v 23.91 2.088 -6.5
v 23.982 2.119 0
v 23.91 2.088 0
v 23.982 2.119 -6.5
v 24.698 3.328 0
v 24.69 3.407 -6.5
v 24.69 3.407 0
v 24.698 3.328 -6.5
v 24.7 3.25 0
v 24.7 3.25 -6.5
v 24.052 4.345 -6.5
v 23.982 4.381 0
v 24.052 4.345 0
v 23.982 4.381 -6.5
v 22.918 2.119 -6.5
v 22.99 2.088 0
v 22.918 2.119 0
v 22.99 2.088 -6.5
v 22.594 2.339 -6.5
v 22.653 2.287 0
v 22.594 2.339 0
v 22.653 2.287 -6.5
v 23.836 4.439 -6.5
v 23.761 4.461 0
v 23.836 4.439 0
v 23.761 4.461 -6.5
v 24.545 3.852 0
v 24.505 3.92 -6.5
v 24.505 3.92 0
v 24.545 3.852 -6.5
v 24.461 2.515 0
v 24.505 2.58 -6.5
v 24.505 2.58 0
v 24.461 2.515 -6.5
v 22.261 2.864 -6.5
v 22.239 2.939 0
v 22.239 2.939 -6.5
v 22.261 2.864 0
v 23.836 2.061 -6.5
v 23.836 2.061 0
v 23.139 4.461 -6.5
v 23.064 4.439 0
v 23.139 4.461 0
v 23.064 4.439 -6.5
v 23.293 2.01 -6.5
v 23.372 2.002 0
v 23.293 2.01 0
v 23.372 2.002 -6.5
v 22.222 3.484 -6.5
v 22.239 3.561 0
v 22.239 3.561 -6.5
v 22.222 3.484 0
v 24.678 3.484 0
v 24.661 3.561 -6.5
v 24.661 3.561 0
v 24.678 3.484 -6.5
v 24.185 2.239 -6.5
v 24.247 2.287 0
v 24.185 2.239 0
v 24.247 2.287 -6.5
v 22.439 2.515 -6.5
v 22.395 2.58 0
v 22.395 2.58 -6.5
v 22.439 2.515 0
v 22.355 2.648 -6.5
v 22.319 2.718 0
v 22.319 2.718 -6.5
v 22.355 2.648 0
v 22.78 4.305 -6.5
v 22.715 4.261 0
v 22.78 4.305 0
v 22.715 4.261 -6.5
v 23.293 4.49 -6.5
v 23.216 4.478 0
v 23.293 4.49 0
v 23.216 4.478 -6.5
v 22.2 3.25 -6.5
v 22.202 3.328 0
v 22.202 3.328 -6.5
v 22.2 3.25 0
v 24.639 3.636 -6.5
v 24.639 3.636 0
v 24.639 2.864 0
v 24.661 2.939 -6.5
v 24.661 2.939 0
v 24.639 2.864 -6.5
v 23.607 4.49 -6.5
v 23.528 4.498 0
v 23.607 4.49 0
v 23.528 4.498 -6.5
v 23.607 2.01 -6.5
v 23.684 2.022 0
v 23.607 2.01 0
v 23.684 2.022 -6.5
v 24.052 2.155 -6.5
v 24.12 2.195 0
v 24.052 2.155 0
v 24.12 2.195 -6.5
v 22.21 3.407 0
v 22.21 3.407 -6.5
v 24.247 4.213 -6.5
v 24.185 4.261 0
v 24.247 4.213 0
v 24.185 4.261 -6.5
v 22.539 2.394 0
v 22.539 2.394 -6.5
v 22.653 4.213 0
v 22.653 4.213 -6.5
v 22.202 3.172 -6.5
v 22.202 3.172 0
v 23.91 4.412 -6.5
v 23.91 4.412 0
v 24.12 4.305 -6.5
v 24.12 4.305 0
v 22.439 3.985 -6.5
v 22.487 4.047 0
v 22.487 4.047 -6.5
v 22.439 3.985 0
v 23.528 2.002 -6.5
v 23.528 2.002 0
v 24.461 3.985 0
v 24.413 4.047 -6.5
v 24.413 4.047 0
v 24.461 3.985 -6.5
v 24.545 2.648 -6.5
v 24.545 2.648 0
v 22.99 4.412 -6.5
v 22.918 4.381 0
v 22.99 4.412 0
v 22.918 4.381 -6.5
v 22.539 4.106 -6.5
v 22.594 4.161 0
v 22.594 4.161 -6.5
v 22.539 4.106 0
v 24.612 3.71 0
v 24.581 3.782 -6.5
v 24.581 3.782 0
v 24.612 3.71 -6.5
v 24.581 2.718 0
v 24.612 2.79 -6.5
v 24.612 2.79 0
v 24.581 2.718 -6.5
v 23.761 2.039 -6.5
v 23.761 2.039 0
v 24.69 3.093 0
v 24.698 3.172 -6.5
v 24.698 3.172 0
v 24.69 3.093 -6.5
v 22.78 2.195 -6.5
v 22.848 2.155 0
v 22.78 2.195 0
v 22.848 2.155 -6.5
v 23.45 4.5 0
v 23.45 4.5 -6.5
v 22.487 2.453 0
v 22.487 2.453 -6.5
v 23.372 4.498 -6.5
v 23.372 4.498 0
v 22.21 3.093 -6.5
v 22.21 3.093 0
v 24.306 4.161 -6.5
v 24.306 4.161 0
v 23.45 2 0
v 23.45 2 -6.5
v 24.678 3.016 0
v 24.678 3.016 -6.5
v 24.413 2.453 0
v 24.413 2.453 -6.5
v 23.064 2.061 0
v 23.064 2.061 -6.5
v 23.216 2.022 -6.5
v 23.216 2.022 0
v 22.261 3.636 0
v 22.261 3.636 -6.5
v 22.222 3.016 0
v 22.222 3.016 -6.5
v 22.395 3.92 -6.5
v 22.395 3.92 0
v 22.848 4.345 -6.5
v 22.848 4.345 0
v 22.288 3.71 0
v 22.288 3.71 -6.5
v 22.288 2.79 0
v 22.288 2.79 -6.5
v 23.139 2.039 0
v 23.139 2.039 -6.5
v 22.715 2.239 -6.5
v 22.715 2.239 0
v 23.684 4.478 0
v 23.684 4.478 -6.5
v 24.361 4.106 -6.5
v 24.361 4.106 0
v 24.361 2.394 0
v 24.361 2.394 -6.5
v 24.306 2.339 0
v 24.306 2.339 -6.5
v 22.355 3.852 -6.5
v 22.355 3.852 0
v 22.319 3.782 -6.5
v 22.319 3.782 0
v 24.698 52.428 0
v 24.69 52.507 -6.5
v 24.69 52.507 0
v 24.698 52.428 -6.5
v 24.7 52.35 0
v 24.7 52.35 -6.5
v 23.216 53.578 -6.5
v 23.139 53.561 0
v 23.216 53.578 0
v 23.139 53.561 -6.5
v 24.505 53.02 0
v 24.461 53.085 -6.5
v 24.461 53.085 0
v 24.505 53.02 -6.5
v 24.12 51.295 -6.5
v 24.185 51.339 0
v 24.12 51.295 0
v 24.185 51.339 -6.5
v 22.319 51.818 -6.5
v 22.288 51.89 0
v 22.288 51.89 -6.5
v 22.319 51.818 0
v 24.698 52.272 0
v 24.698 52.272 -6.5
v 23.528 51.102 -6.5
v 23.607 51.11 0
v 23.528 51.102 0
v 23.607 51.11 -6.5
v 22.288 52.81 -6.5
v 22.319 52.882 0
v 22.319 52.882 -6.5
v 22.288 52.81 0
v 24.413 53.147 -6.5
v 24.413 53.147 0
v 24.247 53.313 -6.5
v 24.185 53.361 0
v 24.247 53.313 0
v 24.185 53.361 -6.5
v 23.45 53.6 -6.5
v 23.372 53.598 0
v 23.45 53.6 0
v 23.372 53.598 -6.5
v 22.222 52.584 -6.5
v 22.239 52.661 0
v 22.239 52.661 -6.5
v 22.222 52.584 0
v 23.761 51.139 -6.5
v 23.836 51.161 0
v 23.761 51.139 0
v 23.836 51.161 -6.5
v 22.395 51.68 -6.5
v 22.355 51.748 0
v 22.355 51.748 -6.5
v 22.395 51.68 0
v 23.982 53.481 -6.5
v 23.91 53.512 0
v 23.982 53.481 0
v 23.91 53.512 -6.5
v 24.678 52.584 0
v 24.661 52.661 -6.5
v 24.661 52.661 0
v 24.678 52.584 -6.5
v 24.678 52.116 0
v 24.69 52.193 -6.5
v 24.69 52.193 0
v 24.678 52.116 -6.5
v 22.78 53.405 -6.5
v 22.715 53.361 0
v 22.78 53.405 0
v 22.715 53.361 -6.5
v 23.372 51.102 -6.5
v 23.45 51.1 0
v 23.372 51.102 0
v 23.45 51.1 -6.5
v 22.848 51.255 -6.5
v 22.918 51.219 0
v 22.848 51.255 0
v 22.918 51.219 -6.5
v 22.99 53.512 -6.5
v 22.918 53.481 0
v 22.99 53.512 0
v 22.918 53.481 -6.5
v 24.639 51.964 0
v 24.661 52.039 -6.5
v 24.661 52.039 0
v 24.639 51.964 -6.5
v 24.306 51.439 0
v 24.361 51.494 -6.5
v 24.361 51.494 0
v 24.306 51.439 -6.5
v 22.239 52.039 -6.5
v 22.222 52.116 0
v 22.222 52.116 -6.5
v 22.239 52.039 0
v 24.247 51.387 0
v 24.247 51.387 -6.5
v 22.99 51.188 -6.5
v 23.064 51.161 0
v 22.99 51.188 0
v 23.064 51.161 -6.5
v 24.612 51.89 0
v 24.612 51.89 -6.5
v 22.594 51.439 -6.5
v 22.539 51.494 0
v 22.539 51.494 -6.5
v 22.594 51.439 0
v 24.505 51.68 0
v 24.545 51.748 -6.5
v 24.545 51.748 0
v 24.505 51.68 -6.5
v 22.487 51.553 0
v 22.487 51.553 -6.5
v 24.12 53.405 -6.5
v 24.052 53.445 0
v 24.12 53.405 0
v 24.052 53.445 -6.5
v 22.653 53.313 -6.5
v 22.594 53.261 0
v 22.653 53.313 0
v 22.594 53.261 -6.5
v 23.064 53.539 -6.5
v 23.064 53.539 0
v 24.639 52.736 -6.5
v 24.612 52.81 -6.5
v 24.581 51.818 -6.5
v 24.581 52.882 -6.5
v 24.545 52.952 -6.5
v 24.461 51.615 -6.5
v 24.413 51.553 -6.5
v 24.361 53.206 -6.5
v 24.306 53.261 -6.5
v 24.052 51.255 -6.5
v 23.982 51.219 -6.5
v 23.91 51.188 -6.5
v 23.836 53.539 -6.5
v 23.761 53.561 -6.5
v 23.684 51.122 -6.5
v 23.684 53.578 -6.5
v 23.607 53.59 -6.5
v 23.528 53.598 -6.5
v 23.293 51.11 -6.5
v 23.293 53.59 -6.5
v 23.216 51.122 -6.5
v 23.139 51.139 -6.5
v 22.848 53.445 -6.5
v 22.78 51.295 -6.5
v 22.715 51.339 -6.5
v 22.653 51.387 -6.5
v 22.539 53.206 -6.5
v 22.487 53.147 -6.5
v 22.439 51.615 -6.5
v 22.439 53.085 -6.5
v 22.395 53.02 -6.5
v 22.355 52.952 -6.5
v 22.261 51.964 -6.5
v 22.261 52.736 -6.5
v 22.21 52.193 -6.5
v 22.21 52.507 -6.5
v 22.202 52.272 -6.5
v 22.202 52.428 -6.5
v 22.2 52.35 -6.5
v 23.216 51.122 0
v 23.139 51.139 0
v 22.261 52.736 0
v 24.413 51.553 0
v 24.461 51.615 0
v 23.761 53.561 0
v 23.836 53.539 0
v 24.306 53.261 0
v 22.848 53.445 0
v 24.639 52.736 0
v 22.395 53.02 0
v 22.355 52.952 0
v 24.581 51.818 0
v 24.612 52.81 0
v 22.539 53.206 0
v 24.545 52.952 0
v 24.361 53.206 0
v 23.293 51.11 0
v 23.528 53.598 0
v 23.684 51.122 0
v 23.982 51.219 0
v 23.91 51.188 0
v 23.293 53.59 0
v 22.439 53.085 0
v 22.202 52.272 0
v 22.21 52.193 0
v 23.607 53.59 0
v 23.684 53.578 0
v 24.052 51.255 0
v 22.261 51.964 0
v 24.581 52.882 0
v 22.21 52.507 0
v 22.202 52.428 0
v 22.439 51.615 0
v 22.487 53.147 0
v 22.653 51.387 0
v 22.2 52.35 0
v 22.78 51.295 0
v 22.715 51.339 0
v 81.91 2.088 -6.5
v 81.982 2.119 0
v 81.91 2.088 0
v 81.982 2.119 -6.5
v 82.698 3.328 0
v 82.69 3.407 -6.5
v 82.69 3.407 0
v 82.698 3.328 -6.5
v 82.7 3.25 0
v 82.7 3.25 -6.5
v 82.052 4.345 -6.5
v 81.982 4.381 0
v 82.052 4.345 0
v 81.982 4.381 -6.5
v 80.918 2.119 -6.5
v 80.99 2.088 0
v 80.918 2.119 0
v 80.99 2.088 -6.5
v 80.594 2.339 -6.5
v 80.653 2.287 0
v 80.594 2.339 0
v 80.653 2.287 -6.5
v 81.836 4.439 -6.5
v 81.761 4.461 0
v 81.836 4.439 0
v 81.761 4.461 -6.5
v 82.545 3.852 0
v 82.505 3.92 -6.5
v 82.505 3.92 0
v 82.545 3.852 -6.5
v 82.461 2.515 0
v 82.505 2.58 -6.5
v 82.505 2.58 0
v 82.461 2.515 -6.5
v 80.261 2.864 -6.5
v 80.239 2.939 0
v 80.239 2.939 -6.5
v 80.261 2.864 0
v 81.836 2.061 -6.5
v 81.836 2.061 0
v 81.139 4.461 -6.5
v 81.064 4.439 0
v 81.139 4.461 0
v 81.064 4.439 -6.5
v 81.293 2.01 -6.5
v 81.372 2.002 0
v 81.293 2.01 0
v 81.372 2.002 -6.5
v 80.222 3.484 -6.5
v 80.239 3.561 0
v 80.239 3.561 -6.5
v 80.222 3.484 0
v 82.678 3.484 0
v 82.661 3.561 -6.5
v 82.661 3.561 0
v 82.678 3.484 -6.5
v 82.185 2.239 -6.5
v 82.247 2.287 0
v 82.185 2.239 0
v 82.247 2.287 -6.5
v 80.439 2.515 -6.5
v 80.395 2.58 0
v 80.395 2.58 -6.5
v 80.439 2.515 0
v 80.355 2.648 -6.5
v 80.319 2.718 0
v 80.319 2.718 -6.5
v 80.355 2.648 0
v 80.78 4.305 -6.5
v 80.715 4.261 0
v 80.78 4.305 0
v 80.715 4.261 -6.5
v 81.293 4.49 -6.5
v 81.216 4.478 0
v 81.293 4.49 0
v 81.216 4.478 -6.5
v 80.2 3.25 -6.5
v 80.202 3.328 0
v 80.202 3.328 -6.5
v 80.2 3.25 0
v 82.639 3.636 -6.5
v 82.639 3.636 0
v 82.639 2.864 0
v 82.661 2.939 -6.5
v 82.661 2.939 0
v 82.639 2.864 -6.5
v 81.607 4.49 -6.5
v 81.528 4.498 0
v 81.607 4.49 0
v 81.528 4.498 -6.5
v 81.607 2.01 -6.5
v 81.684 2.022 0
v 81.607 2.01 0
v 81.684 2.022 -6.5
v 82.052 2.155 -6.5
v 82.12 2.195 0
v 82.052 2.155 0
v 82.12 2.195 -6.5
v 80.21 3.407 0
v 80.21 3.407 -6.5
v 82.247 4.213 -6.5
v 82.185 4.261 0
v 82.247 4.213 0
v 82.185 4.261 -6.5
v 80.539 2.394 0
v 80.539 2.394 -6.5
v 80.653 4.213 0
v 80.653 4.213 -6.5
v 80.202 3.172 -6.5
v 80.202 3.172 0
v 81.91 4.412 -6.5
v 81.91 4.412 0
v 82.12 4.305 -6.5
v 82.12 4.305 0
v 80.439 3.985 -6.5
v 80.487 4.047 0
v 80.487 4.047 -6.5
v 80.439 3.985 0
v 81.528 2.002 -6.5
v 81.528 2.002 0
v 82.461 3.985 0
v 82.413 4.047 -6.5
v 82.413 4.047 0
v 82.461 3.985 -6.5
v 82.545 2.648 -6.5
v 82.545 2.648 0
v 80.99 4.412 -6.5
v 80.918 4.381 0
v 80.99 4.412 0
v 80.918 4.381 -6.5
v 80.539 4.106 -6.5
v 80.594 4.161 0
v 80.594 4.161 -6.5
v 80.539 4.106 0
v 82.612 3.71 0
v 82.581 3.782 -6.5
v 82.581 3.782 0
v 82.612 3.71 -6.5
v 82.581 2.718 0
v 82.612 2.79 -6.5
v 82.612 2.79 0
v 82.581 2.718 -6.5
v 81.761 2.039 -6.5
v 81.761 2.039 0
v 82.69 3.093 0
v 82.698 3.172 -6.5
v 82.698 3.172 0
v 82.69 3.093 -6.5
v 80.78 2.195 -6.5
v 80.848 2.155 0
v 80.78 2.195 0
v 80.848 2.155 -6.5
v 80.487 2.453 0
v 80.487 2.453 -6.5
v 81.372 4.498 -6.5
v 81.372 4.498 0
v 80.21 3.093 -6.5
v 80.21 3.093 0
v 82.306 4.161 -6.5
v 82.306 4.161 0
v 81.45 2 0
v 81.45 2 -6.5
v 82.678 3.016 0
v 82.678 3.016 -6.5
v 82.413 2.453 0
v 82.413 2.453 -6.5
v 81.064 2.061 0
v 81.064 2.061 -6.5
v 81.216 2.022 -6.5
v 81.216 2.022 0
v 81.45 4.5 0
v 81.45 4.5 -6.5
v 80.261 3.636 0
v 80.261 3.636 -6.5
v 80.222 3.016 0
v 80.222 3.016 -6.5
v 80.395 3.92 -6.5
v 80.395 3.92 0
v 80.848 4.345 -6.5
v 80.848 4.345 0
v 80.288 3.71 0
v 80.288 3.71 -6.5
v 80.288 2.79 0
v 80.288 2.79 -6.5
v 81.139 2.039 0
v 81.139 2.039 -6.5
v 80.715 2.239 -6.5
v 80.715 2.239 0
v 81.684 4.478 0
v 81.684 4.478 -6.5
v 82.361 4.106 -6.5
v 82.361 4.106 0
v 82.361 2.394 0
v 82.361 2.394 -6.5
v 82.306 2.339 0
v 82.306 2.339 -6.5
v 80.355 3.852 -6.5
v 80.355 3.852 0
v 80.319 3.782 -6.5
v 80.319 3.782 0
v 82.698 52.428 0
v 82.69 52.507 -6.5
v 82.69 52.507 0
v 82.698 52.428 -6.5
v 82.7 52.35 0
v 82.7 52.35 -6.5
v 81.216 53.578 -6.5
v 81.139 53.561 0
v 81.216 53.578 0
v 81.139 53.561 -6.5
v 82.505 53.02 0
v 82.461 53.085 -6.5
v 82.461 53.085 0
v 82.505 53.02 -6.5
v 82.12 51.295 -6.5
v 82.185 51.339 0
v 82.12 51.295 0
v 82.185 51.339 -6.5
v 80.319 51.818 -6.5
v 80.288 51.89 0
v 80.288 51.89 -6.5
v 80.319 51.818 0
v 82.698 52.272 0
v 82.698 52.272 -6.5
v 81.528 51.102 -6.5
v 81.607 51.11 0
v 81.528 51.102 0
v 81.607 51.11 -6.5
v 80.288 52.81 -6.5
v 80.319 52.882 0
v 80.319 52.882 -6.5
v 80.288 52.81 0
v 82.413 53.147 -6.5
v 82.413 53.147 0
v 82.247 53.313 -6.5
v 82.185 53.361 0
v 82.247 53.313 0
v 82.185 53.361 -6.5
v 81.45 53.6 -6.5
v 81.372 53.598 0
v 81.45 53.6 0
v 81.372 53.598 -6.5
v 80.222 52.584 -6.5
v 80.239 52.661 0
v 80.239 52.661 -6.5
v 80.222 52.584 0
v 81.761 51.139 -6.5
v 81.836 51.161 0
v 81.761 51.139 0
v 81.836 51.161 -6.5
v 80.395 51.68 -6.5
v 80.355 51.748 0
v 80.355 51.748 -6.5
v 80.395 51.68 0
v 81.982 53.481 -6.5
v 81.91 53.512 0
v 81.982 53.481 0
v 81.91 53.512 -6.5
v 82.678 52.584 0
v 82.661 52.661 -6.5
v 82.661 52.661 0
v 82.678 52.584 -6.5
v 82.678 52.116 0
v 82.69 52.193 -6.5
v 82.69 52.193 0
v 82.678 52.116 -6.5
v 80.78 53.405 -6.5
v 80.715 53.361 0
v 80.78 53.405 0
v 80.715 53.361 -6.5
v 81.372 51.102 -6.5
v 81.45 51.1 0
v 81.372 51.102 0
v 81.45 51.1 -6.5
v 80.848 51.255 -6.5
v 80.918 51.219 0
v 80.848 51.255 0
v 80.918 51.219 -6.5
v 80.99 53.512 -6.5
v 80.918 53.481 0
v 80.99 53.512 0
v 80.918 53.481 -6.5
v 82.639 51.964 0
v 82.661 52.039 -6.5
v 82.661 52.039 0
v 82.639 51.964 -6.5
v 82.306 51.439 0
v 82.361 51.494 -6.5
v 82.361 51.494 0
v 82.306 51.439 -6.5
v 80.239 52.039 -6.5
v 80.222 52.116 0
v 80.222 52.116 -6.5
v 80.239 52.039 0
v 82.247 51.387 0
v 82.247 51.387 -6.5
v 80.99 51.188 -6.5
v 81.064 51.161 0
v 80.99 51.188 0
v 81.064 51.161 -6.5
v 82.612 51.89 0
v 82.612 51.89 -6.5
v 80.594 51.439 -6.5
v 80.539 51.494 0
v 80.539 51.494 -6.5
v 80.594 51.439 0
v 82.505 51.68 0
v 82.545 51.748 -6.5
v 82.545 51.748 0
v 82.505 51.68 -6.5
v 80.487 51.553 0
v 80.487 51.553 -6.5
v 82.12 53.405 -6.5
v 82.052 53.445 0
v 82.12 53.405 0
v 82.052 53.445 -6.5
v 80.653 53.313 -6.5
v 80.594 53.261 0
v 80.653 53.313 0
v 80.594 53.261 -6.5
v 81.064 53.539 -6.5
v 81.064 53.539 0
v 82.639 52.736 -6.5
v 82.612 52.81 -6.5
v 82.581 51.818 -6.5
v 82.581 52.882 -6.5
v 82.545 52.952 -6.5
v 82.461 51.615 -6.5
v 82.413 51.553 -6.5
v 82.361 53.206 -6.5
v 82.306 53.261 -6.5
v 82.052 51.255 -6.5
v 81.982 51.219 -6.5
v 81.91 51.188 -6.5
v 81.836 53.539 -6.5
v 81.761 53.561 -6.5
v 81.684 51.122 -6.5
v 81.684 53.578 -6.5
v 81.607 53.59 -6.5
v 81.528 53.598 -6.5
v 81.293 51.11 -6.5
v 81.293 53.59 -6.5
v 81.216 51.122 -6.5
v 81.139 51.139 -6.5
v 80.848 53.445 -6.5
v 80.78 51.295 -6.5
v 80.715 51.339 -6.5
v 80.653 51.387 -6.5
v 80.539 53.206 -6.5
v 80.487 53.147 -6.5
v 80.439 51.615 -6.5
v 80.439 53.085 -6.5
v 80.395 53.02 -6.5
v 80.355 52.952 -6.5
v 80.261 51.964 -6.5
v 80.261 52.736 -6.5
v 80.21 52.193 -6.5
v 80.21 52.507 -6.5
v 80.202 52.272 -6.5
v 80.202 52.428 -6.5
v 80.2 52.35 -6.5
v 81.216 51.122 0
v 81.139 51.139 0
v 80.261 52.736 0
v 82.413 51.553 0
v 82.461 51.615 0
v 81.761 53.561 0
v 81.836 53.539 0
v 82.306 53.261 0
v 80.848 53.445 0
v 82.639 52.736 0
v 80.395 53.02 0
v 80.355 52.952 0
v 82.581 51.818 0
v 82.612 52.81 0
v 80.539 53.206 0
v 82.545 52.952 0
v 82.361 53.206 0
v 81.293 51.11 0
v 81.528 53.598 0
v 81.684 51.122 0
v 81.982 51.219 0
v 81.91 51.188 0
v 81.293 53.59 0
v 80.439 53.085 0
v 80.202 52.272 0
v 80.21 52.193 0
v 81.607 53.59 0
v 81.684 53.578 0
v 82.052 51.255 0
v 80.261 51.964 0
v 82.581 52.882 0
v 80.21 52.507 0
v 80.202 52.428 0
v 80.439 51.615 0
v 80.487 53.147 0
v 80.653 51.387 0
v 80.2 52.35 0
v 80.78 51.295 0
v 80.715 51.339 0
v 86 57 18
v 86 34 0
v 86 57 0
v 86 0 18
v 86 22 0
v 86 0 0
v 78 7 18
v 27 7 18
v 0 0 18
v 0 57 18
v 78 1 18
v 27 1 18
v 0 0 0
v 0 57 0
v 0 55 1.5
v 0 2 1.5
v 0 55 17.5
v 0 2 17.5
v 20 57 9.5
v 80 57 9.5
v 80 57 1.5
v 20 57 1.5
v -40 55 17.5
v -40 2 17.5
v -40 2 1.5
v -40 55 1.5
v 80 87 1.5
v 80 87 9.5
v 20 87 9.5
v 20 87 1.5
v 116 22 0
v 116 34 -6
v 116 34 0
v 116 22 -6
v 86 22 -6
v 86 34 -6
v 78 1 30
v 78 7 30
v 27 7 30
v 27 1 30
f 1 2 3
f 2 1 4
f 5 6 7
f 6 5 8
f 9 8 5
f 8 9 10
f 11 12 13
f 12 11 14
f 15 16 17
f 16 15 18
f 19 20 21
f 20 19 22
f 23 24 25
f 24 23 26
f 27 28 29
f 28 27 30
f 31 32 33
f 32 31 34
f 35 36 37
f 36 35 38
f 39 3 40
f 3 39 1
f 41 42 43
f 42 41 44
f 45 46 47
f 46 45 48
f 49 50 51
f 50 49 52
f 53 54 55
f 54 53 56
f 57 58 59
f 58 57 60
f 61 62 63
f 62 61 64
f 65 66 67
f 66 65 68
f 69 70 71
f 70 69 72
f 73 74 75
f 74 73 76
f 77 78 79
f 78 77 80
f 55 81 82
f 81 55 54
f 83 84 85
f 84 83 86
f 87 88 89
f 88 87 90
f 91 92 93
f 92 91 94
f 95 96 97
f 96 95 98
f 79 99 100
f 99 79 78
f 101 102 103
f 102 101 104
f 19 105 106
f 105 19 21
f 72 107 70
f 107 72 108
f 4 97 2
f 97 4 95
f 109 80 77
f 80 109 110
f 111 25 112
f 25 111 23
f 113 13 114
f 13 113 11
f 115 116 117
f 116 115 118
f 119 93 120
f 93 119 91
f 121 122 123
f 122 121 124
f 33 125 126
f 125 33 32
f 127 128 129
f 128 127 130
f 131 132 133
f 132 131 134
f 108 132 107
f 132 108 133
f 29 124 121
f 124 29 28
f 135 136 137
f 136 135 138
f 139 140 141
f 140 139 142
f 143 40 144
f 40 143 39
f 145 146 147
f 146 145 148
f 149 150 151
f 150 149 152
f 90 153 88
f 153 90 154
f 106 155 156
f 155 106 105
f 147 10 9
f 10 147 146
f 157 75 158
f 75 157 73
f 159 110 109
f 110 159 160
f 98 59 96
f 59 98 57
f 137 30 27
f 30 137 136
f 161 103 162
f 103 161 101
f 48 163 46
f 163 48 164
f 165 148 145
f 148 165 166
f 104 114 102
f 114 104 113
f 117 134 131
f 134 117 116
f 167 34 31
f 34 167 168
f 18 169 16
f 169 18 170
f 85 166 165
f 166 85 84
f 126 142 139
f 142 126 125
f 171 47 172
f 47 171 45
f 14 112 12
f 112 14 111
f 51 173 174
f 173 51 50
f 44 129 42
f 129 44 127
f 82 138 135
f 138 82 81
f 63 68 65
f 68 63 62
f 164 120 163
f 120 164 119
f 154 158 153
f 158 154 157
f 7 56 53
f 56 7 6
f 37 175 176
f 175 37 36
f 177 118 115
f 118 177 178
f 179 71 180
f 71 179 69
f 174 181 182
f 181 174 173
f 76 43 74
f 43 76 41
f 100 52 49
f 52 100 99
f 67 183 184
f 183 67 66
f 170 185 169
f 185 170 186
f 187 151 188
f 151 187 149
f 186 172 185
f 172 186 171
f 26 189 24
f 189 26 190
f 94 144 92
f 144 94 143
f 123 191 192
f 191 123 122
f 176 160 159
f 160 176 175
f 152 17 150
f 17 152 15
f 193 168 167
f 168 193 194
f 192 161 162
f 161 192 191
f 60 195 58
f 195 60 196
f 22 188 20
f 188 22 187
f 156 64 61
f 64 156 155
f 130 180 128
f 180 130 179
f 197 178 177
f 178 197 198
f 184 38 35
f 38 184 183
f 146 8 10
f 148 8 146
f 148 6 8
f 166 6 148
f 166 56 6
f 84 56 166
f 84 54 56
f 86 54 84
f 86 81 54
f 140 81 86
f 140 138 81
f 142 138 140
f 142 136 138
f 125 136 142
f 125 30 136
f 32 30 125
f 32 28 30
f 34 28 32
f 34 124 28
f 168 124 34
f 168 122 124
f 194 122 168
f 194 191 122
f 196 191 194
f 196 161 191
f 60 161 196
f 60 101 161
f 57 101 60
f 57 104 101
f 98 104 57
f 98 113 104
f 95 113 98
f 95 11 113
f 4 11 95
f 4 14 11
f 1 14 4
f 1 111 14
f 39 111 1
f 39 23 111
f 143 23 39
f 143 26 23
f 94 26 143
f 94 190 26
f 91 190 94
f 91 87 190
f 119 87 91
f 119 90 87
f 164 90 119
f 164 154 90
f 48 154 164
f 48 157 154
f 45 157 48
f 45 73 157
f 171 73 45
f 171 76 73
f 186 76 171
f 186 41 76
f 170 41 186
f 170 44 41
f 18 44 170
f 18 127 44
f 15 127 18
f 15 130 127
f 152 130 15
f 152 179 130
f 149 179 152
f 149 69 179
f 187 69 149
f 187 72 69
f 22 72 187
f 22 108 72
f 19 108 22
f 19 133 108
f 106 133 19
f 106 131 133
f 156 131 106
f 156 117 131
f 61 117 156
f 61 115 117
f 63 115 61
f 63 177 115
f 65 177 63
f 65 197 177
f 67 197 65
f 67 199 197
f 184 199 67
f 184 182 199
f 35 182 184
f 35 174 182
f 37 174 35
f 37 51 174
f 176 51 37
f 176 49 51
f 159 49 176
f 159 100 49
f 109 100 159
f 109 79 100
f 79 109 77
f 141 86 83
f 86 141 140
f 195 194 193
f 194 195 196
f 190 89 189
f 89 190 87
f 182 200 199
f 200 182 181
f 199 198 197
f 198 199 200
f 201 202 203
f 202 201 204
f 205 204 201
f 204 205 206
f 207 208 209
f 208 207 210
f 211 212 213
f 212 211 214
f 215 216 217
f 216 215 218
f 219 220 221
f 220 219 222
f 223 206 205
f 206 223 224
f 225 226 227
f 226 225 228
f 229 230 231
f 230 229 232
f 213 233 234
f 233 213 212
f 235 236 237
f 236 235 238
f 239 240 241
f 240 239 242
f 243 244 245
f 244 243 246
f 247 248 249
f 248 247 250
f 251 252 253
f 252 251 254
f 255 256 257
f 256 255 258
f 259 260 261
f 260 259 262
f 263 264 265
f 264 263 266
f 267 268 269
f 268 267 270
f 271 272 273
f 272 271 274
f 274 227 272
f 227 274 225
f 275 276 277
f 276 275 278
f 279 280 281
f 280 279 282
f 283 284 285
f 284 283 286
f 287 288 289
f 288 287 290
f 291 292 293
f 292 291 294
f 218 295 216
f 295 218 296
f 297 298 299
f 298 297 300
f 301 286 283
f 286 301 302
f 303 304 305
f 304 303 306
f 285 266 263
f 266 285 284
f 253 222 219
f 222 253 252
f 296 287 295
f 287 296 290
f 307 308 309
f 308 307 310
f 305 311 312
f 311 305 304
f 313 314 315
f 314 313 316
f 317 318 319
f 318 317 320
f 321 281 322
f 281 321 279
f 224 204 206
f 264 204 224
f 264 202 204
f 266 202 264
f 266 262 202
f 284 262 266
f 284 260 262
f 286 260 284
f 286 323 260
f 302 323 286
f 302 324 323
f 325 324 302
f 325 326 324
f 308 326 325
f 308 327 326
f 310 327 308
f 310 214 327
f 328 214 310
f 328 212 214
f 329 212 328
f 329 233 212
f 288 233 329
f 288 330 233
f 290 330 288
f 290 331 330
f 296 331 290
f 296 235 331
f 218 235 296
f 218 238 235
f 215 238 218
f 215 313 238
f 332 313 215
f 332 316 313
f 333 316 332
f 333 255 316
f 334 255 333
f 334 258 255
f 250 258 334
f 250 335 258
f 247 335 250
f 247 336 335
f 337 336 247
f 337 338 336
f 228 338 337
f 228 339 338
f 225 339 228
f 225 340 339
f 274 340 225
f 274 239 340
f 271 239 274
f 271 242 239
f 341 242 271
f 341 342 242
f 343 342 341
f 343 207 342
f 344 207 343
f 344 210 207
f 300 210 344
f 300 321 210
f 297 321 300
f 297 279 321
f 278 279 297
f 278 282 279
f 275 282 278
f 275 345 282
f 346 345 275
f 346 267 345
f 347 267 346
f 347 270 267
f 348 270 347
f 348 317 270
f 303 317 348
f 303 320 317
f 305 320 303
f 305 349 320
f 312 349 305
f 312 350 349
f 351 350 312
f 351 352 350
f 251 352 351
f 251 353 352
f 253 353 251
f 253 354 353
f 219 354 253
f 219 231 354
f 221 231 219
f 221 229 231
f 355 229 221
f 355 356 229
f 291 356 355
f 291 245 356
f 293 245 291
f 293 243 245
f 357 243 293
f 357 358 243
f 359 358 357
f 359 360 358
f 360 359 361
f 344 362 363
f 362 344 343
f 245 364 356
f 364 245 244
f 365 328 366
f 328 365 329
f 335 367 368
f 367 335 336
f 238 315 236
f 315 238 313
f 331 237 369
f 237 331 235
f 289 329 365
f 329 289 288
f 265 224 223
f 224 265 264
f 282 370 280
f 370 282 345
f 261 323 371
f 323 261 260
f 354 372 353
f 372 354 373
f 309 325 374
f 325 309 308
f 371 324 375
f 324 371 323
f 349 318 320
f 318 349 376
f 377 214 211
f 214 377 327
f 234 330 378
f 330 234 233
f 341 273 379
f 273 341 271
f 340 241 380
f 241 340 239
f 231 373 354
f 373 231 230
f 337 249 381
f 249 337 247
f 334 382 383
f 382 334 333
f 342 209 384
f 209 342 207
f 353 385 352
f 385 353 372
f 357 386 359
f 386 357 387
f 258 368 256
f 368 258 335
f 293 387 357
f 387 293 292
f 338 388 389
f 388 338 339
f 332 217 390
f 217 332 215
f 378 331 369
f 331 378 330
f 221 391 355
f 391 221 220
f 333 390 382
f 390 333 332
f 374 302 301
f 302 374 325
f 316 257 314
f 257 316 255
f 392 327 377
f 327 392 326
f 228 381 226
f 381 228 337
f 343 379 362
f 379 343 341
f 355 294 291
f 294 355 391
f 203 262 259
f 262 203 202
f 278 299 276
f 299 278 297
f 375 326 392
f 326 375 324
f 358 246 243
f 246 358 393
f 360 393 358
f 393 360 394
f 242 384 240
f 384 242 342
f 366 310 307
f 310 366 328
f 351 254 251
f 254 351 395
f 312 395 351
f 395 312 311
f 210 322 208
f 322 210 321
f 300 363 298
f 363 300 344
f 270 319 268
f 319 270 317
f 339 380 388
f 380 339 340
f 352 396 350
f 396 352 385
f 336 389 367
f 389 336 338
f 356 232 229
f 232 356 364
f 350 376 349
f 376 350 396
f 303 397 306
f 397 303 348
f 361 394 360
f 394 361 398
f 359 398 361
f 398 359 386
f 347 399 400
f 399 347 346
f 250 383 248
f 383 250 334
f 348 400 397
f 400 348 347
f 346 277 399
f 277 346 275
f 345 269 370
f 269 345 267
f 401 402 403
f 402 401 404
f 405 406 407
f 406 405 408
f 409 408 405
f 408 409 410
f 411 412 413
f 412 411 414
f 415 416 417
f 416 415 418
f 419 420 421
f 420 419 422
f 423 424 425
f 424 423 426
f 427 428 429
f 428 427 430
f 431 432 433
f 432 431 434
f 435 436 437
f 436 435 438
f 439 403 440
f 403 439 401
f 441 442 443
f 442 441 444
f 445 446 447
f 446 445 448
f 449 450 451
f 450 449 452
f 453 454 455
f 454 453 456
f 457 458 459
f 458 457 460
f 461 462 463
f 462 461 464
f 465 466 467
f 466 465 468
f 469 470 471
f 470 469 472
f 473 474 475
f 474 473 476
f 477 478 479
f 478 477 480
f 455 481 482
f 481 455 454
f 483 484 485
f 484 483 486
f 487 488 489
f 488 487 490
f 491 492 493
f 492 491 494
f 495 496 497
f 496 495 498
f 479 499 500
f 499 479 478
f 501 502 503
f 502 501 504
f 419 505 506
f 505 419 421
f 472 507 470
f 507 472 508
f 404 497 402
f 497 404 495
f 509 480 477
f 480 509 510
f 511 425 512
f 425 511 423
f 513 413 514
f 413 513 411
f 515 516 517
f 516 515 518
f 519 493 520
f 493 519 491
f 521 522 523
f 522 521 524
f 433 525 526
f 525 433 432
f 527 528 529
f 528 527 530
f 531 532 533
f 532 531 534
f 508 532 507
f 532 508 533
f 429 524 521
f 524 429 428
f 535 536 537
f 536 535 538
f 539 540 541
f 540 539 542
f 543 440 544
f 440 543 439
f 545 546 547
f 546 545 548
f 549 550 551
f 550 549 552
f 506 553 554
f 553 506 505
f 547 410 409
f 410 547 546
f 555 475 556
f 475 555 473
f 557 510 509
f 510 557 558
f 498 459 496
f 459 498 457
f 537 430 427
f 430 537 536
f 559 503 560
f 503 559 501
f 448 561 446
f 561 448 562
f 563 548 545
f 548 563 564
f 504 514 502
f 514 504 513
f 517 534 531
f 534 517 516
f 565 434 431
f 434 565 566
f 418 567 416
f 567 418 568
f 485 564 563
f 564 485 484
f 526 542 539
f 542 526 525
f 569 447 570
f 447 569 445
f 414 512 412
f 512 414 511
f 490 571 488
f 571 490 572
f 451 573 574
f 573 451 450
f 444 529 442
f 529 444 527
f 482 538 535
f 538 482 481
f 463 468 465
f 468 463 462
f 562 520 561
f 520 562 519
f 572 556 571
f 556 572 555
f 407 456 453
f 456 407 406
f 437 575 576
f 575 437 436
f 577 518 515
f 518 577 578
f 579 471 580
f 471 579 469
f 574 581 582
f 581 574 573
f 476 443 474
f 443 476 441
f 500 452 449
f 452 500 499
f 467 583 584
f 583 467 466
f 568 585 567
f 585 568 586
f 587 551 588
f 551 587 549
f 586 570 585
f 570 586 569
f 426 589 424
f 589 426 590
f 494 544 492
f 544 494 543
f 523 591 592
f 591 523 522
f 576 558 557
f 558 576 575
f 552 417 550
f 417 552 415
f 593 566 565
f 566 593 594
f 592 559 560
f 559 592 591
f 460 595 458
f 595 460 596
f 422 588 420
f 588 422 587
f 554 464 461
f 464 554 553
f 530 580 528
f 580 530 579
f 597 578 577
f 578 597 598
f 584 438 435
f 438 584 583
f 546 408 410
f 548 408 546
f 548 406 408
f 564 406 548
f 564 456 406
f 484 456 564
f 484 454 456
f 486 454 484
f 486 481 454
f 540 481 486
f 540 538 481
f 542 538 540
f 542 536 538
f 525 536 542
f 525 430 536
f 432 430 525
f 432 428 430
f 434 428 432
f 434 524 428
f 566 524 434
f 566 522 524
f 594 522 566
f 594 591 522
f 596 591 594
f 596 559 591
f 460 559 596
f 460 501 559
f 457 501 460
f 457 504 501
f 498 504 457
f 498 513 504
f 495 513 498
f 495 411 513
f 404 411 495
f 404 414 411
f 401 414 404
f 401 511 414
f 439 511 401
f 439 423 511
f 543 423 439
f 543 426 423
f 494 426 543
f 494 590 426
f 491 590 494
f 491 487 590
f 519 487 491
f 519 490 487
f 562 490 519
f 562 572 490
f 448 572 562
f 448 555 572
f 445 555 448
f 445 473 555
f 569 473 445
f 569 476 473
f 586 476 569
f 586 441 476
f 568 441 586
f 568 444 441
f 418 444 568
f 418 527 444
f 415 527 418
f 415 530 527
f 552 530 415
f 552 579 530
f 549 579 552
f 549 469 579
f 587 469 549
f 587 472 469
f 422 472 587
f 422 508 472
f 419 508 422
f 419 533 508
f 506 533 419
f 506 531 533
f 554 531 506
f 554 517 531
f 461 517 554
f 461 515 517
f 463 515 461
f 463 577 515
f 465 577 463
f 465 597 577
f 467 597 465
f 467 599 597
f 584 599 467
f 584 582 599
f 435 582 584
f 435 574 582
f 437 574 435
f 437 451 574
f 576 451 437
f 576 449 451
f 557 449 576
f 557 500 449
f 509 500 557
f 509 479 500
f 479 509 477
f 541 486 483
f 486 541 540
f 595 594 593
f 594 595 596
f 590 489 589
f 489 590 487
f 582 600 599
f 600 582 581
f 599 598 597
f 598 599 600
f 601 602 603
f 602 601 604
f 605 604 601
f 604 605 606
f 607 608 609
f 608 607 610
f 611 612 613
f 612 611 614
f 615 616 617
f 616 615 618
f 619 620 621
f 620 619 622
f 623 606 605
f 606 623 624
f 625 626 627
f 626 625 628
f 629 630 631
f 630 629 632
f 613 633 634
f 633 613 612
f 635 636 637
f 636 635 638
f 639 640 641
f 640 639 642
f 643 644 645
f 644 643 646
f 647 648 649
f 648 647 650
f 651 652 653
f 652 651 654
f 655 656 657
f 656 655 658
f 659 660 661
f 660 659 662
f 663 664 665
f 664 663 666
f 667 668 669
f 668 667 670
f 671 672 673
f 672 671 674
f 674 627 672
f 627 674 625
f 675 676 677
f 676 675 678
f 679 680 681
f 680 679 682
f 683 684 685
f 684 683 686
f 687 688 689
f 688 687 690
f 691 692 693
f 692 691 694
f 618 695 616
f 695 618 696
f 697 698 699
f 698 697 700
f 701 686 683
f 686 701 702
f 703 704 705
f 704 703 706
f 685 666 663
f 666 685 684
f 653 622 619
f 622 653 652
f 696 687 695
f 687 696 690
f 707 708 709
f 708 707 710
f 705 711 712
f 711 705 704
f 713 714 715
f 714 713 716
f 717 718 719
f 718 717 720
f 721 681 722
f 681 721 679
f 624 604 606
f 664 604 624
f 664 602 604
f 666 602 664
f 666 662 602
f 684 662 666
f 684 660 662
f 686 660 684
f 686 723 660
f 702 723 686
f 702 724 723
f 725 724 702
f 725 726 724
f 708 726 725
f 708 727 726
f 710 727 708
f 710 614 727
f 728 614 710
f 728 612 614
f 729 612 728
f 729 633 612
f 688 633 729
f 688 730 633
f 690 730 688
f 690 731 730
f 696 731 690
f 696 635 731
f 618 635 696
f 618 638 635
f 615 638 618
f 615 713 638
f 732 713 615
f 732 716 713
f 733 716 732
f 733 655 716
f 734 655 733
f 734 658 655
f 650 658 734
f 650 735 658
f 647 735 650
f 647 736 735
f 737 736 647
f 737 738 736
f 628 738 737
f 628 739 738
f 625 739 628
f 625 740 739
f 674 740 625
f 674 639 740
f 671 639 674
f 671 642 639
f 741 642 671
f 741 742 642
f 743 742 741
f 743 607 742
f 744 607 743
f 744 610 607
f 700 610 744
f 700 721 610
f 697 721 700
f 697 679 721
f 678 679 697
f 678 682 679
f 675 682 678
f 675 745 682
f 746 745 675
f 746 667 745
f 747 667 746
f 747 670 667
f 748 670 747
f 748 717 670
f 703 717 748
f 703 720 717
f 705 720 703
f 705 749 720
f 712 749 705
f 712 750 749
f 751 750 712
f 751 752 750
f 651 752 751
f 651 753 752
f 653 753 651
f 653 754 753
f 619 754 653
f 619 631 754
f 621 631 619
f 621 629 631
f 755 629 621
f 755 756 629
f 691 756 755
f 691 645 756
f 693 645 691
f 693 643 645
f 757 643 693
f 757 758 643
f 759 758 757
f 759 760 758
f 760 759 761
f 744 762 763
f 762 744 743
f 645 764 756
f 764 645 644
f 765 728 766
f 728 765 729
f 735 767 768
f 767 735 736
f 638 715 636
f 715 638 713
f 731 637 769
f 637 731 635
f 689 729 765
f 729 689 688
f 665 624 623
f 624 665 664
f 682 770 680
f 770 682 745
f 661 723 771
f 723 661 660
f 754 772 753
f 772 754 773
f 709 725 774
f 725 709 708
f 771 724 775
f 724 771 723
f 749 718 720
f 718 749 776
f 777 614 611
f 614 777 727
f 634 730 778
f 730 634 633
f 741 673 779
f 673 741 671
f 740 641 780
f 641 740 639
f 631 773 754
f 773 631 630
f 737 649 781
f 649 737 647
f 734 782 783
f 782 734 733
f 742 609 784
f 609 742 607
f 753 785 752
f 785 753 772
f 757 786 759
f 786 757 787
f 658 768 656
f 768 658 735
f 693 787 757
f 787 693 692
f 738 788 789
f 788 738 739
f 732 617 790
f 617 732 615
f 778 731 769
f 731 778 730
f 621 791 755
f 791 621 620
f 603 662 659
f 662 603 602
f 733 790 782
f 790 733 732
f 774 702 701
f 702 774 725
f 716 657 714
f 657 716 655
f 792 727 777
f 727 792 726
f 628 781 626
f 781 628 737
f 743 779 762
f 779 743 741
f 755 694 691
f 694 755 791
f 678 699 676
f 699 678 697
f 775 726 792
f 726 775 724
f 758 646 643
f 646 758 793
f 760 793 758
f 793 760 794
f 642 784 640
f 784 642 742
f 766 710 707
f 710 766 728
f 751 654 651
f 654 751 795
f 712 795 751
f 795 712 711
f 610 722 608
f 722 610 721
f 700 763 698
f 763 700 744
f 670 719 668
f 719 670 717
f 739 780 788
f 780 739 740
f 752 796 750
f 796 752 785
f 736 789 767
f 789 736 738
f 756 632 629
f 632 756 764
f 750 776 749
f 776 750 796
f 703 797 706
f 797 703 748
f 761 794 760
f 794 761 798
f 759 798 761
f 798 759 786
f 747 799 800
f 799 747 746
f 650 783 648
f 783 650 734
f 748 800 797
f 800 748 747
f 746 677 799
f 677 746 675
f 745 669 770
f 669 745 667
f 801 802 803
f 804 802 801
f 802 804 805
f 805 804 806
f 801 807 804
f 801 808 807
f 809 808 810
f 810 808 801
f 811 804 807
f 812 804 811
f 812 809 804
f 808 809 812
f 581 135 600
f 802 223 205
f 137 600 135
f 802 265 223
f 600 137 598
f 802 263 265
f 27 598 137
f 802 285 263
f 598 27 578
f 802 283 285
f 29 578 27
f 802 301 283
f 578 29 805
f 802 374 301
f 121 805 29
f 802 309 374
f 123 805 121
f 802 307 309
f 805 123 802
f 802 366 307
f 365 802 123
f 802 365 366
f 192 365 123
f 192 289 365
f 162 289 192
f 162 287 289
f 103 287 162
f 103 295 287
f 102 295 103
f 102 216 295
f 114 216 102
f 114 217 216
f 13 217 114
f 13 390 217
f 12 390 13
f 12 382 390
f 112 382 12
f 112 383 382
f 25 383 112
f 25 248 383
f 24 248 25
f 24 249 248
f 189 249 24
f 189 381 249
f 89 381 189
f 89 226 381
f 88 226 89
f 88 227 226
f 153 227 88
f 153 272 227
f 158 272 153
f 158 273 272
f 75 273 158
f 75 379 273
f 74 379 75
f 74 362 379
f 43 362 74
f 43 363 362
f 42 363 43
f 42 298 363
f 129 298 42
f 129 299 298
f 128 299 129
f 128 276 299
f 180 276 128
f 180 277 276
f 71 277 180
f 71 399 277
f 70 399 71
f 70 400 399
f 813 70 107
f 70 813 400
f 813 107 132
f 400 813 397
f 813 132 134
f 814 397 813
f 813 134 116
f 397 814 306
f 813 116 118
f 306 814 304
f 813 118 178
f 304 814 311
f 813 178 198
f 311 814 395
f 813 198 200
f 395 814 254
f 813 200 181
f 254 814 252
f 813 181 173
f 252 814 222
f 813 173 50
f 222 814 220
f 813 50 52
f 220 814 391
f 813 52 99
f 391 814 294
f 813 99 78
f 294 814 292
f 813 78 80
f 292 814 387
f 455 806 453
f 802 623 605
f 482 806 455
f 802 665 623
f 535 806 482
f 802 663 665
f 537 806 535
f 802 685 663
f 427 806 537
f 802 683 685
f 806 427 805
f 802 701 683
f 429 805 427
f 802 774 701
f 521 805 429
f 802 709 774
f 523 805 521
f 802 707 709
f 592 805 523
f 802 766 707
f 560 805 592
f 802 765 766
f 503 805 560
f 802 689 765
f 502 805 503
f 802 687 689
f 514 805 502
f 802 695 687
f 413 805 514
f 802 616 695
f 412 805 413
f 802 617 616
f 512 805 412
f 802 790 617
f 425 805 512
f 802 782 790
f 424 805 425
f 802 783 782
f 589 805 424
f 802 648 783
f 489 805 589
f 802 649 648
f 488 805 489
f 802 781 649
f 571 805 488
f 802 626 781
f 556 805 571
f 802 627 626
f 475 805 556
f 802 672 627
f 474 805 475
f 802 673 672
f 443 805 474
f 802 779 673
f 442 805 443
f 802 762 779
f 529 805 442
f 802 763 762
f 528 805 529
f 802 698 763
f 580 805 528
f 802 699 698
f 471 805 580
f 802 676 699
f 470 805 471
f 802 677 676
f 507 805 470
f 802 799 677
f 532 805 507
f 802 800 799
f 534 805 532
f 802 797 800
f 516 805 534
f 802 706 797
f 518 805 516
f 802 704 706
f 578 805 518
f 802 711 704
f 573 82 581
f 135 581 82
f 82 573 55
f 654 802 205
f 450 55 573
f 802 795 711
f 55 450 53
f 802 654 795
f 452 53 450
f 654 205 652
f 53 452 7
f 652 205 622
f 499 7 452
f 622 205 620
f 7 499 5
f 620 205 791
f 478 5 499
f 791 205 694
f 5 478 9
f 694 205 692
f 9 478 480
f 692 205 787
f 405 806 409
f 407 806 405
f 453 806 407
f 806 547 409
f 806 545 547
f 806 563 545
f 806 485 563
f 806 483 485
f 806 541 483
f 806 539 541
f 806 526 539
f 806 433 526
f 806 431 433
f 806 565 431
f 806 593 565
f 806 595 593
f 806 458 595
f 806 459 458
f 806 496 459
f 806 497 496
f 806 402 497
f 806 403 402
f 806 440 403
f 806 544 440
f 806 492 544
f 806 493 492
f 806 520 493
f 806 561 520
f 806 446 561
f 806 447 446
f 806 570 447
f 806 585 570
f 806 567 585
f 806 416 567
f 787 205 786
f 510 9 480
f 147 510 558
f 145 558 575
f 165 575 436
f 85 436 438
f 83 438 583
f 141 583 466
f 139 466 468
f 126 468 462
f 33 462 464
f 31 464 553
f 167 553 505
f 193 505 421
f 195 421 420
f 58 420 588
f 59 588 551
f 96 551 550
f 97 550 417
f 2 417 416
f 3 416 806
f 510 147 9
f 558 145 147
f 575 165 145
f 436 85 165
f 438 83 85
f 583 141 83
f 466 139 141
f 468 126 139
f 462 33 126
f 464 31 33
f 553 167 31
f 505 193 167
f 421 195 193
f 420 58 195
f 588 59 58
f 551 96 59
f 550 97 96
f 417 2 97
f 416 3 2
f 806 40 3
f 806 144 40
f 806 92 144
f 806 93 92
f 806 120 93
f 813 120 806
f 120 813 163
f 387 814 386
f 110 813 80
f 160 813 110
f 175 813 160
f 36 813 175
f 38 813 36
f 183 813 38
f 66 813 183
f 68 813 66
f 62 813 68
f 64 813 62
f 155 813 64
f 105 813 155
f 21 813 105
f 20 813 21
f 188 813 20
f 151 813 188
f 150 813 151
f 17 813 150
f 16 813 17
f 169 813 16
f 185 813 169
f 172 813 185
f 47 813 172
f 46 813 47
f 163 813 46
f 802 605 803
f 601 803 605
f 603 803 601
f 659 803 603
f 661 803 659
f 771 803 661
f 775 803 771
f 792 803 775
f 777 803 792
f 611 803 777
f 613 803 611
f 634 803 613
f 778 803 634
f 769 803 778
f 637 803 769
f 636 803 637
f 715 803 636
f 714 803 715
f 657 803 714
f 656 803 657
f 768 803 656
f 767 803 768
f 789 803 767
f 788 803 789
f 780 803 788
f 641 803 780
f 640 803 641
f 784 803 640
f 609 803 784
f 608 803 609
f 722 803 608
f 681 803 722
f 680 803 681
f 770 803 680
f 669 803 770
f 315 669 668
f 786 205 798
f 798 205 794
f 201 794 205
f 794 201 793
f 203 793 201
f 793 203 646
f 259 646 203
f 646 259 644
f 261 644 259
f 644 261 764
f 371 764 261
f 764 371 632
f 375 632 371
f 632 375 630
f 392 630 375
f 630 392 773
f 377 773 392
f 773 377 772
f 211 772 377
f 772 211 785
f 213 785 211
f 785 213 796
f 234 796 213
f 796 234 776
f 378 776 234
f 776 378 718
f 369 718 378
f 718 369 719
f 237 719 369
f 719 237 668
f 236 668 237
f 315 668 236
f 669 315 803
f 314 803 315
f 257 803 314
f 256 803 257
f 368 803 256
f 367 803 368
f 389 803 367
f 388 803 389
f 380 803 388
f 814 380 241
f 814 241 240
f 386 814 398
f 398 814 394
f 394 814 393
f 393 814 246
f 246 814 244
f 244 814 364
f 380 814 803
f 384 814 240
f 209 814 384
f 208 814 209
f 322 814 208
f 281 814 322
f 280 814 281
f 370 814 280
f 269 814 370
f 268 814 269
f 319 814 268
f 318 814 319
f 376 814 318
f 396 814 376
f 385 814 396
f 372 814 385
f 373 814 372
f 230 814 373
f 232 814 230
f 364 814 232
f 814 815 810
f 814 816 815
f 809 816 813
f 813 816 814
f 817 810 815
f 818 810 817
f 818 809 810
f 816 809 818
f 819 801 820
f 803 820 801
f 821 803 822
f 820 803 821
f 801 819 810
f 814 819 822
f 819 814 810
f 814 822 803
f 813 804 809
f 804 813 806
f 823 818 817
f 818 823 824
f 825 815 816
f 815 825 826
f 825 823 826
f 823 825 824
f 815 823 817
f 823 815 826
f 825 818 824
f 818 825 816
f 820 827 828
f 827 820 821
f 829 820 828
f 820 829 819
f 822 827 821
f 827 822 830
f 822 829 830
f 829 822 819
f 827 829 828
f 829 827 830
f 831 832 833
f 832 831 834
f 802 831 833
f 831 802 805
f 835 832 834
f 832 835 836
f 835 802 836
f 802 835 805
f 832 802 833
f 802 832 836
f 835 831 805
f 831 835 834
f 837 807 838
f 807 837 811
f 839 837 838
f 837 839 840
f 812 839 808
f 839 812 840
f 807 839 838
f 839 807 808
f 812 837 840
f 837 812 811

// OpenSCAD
// Raspberry pi 4 model case by George Onoufriou (Raven, GeorgeRaven, Archer) C 2019-06-30
// please see licence in project root https://github.com/DreamingRaven/RavenSCAD/blob/master/LICENSE

// |-=========---------| <-The back right of the board is the point everything else is relative to
// | o            o    |
// | o            o    |
// ||_|----------------|

board_thickness = 1.5; // the space for the board itself only
pin_space = 3;//2.2; // the min space that the throughhole components require underneath
$fn = 100; // how detailed the circular components are (holes + mounts), not super important
extension = 20; // extension to lengths so case can be subtractiveley created
inhibitionzone_height = 12; // creates an inhibition zone for surface components
case_thickness = 2;//2; // sets the case thickness
pil = 85.5; // this is the length of the pi board only
pid = 56.5; // this is the width / depth of the pi board only
pih = board_thickness;
sd_height = pin_space + case_thickness + board_thickness; // is how tall the sd card part sticking out is so if you increase it will cut more out for case
mount_pin_height = 2*board_thickness + 2*case_thickness + pin_space + inhibitionzone_height;//31; // this is the most awkward one of the set as it sets the mount point pin size

// fan mount options
fan_pin_diam = 3;
fan_position_x = 44.3; // the offset of the fan from the right
fan_position_y = 14; // the offset of the fan from the top
fan_pin_distance = 31.5; // the distance between the mount holes


// uncomment here what you dont want to generate
// translate([0,0,inhibitionzone_height + case_thickness + board_thickness]) rotate([0,180,0]) intersection(){ // top of case
//  rpi4_case();
//  topSelector();
//}
// translate([30,0,case_thickness]) rotate([0,-90,0]) difference(){ // bottom of case
//  rpi4_case();
//  topSelector();
//}
//translate([-pil,pid+case_thickness*2+5]) rpi4_case(); // the whole unsplit case
//translate([extension+17.44,pid+case_thickness*2+5,0]) rpi4(); // the raspberry pi 4 and associated tolerances


// here follows all the modules used to generate what you want.
module topSelector()
{
  difference(){ // this difference selects the top and bottom parts of the case with a small lip for the IO
    translate([-case_thickness,0,0]) cube([pil+2*case_thickness,pid,pin_space+inhibitionzone_height+case_thickness]);  // test hull
    translate([-case_thickness,0,0]) cube([case_thickness,pid,board_thickness]);
  }
}


module rpi4_case()
{
  difference(){ // subtracts the rpi4 model from a cube to generate the case
    translate([-case_thickness,-case_thickness,-(case_thickness + pin_space)])
    cube([pil+(2*case_thickness),
      pid+(2*case_thickness),
      pin_space+inhibitionzone_height+board_thickness+(2*case_thickness)]); // the case itself
    union(){
      rpi4();
      pins(); // generating the pins themselves so the holes can be inhibited
    }
  }
}

module rpi4(){

  difference(){ // this creates the mount holes
    translate([0,0,board_thickness]){ // two translations cancel out but make maths simpler before they do
      translate([0,0,-(board_thickness)]) // the translation which ^ cancels out
      {
        cube([pil,pid,board_thickness]); // the board only (not the underpins)
      }
      // these are the big surface level components
      translate([-(2.81+extension),2.15,0]) cube([21.3+extension,16.3,13.6]);   // Ethenrnet port
      translate([-(2.81+extension),22.6,0]) cube([17.44+extension,13.5,15.6]);  // USB 3.0
      translate([-(2.81+extension),40.6,0]) cube([17.44+extension,13.5,15.6]);  // USB 2.0
      translate([27.36,1,0]) cube([50.7,5.0,8.6+extension]);                    // GPIO pins
      translate([21,7.15,0]) cube([5.0,5.0,8.6+extension]);                     // Power over ethernet pins
      translate([48.0,16.3,0]) cube([15.0,15.0,2.5]);                           // cpu
      translate([67.5,6.8,0]) cube([10.8,13.1,1.8]);                            // onboard wifi
      translate([79,17.3,0]) cube([2.5,22.15,5.4+extension]);                   // display connector
      translate([69.1,50,0]) cube([9.7,7.4+extension,3.6]);                     // USB type c power
      translate([55.0,50,0]) cube([7.95,7.8+extension,3.9]);                    // Micro HDMI0
      translate([41.2,50,0]) cube([7.95,7.8+extension,3.9]);                    // Micro HDMI1
      translate([37.4,34.1,0]) cube([2.5,22.15,5.4+extension]);                 // CSI camera connector
      translate([26.9,43.55,0]) cube([8.5,14.95+extension,6.9]);                  // Audio jack
      translate([85,22.4,-(board_thickness+sd_height)]) cube([2.55+extension,11.11,sd_height]); // SD card (poking out)
      translate([fan_position_x,fan_position_y,0]) cylinder(extension,d=fan_pin_diam, center=false);                            // fan mount top-r
      translate([fan_position_x,fan_position_y+fan_pin_distance,0]) cylinder(extension,d=fan_pin_diam, center=false);                 // fan mount bot-r
      translate([fan_position_x+fan_pin_distance,fan_position_y,0]) cylinder(extension,d=fan_pin_diam, center=false);                 // fan mount top-l
      translate([fan_position_x+fan_pin_distance,fan_position_y+fan_pin_distance,0]) cylinder(extension,d=fan_pin_diam, center=false);      // fan mount bot-l
      translate([fan_position_x+0.5*fan_pin_distance,fan_position_y+0.5*fan_pin_distance,0]) cylinder(extension,d=fan_pin_distance+fan_pin_diam, center=false);      // fan air hole
      translate([53,7.8,0]){ scale([10,1,1]){

//        translate([0,0,-extension-board_thickness-pin_space])  cylinder(extension,d=5, center=false);      // under-side air hole
//        translate([0,10,-extension-board_thickness-pin_space]) cylinder(extension,d=5, center=false);      // under-side air hole
//        translate([0,20,-extension-board_thickness-pin_space]) cylinder(extension,d=5, center=false);      // under-side air hole
//        translate([0,30,-extension-board_thickness-pin_space]) cylinder(extension,d=5, center=false);      // under-side air hole
//        translate([0,40,-extension-board_thickness-pin_space]) cylinder(extension,d=5, center=false);      // under-side air hole
      }
      }

      difference(){ // this creates the mount points around the mount holes esp the underneath ones
        union(){
          translate([0,0,0]) cube([pil,pid,inhibitionzone_height]);                           // cpu
          translate([0,0,-(pin_space+board_thickness)]) cube([pil,pid,pin_space]); // underpins only
        }
        mounts(); // the material which is above and below the board to keep it in place which the pins go through
      }
    } // end of translation cancel
  pins(); // the hole which will be screwed into to put both halves of the case and board together
  }
}

rpi4_simple();

module rpi4_simple(){
    cube([86,57,18]);
    translate([-40,2.,1.5])cube([40,53,16]); //ethernet +++
    translate([20,57,1.5])cube([60,30,8]); //resten
    translate([86,22,-6])cube([30,12,6]); //sd
    translate([27,1,0])cube([51,6,30]); //gpio
    pins(); // t

}

module mounts(){
  translate([1.25,1.25,(0.5*mount_pin_height)-(board_thickness+case_thickness+pin_space)]){ // this is to move all the pins
          translate([22.2,2,0]) cylinder(mount_pin_height,d=5.9, center=true);     // mount top-r
          translate([22.2,51.1,0]) cylinder(mount_pin_height,d=5.9, center=true);  // mount bot-r
          translate([80.2,2,0]) cylinder(mount_pin_height,d=5.9, center=true);     // mount top-l
          translate([80.2,51.1,0]) cylinder(mount_pin_height,d=5.9, center=true);  // mount bot-l
        }
}

module pins(){
  translate([1.25,1.25,(0.5*mount_pin_height)-(board_thickness+case_thickness+pin_space)]){ // this is to move all the pins
    translate([22.2,2,0]) cylinder(mount_pin_height,d=2.5, center=true);     // hole  top-r
    translate([22.2,51.1,0]) cylinder(mount_pin_height,d=2.5, center=true);  // hole  bot-r
    translate([80.2,2,0]) cylinder(mount_pin_height,d=2.5, center=true);     // hole  top-l
    translate([80.2,51.1,0]) cylinder(mount_pin_height,d=2.5, center=true);  // hole  bot-l
  }
}
